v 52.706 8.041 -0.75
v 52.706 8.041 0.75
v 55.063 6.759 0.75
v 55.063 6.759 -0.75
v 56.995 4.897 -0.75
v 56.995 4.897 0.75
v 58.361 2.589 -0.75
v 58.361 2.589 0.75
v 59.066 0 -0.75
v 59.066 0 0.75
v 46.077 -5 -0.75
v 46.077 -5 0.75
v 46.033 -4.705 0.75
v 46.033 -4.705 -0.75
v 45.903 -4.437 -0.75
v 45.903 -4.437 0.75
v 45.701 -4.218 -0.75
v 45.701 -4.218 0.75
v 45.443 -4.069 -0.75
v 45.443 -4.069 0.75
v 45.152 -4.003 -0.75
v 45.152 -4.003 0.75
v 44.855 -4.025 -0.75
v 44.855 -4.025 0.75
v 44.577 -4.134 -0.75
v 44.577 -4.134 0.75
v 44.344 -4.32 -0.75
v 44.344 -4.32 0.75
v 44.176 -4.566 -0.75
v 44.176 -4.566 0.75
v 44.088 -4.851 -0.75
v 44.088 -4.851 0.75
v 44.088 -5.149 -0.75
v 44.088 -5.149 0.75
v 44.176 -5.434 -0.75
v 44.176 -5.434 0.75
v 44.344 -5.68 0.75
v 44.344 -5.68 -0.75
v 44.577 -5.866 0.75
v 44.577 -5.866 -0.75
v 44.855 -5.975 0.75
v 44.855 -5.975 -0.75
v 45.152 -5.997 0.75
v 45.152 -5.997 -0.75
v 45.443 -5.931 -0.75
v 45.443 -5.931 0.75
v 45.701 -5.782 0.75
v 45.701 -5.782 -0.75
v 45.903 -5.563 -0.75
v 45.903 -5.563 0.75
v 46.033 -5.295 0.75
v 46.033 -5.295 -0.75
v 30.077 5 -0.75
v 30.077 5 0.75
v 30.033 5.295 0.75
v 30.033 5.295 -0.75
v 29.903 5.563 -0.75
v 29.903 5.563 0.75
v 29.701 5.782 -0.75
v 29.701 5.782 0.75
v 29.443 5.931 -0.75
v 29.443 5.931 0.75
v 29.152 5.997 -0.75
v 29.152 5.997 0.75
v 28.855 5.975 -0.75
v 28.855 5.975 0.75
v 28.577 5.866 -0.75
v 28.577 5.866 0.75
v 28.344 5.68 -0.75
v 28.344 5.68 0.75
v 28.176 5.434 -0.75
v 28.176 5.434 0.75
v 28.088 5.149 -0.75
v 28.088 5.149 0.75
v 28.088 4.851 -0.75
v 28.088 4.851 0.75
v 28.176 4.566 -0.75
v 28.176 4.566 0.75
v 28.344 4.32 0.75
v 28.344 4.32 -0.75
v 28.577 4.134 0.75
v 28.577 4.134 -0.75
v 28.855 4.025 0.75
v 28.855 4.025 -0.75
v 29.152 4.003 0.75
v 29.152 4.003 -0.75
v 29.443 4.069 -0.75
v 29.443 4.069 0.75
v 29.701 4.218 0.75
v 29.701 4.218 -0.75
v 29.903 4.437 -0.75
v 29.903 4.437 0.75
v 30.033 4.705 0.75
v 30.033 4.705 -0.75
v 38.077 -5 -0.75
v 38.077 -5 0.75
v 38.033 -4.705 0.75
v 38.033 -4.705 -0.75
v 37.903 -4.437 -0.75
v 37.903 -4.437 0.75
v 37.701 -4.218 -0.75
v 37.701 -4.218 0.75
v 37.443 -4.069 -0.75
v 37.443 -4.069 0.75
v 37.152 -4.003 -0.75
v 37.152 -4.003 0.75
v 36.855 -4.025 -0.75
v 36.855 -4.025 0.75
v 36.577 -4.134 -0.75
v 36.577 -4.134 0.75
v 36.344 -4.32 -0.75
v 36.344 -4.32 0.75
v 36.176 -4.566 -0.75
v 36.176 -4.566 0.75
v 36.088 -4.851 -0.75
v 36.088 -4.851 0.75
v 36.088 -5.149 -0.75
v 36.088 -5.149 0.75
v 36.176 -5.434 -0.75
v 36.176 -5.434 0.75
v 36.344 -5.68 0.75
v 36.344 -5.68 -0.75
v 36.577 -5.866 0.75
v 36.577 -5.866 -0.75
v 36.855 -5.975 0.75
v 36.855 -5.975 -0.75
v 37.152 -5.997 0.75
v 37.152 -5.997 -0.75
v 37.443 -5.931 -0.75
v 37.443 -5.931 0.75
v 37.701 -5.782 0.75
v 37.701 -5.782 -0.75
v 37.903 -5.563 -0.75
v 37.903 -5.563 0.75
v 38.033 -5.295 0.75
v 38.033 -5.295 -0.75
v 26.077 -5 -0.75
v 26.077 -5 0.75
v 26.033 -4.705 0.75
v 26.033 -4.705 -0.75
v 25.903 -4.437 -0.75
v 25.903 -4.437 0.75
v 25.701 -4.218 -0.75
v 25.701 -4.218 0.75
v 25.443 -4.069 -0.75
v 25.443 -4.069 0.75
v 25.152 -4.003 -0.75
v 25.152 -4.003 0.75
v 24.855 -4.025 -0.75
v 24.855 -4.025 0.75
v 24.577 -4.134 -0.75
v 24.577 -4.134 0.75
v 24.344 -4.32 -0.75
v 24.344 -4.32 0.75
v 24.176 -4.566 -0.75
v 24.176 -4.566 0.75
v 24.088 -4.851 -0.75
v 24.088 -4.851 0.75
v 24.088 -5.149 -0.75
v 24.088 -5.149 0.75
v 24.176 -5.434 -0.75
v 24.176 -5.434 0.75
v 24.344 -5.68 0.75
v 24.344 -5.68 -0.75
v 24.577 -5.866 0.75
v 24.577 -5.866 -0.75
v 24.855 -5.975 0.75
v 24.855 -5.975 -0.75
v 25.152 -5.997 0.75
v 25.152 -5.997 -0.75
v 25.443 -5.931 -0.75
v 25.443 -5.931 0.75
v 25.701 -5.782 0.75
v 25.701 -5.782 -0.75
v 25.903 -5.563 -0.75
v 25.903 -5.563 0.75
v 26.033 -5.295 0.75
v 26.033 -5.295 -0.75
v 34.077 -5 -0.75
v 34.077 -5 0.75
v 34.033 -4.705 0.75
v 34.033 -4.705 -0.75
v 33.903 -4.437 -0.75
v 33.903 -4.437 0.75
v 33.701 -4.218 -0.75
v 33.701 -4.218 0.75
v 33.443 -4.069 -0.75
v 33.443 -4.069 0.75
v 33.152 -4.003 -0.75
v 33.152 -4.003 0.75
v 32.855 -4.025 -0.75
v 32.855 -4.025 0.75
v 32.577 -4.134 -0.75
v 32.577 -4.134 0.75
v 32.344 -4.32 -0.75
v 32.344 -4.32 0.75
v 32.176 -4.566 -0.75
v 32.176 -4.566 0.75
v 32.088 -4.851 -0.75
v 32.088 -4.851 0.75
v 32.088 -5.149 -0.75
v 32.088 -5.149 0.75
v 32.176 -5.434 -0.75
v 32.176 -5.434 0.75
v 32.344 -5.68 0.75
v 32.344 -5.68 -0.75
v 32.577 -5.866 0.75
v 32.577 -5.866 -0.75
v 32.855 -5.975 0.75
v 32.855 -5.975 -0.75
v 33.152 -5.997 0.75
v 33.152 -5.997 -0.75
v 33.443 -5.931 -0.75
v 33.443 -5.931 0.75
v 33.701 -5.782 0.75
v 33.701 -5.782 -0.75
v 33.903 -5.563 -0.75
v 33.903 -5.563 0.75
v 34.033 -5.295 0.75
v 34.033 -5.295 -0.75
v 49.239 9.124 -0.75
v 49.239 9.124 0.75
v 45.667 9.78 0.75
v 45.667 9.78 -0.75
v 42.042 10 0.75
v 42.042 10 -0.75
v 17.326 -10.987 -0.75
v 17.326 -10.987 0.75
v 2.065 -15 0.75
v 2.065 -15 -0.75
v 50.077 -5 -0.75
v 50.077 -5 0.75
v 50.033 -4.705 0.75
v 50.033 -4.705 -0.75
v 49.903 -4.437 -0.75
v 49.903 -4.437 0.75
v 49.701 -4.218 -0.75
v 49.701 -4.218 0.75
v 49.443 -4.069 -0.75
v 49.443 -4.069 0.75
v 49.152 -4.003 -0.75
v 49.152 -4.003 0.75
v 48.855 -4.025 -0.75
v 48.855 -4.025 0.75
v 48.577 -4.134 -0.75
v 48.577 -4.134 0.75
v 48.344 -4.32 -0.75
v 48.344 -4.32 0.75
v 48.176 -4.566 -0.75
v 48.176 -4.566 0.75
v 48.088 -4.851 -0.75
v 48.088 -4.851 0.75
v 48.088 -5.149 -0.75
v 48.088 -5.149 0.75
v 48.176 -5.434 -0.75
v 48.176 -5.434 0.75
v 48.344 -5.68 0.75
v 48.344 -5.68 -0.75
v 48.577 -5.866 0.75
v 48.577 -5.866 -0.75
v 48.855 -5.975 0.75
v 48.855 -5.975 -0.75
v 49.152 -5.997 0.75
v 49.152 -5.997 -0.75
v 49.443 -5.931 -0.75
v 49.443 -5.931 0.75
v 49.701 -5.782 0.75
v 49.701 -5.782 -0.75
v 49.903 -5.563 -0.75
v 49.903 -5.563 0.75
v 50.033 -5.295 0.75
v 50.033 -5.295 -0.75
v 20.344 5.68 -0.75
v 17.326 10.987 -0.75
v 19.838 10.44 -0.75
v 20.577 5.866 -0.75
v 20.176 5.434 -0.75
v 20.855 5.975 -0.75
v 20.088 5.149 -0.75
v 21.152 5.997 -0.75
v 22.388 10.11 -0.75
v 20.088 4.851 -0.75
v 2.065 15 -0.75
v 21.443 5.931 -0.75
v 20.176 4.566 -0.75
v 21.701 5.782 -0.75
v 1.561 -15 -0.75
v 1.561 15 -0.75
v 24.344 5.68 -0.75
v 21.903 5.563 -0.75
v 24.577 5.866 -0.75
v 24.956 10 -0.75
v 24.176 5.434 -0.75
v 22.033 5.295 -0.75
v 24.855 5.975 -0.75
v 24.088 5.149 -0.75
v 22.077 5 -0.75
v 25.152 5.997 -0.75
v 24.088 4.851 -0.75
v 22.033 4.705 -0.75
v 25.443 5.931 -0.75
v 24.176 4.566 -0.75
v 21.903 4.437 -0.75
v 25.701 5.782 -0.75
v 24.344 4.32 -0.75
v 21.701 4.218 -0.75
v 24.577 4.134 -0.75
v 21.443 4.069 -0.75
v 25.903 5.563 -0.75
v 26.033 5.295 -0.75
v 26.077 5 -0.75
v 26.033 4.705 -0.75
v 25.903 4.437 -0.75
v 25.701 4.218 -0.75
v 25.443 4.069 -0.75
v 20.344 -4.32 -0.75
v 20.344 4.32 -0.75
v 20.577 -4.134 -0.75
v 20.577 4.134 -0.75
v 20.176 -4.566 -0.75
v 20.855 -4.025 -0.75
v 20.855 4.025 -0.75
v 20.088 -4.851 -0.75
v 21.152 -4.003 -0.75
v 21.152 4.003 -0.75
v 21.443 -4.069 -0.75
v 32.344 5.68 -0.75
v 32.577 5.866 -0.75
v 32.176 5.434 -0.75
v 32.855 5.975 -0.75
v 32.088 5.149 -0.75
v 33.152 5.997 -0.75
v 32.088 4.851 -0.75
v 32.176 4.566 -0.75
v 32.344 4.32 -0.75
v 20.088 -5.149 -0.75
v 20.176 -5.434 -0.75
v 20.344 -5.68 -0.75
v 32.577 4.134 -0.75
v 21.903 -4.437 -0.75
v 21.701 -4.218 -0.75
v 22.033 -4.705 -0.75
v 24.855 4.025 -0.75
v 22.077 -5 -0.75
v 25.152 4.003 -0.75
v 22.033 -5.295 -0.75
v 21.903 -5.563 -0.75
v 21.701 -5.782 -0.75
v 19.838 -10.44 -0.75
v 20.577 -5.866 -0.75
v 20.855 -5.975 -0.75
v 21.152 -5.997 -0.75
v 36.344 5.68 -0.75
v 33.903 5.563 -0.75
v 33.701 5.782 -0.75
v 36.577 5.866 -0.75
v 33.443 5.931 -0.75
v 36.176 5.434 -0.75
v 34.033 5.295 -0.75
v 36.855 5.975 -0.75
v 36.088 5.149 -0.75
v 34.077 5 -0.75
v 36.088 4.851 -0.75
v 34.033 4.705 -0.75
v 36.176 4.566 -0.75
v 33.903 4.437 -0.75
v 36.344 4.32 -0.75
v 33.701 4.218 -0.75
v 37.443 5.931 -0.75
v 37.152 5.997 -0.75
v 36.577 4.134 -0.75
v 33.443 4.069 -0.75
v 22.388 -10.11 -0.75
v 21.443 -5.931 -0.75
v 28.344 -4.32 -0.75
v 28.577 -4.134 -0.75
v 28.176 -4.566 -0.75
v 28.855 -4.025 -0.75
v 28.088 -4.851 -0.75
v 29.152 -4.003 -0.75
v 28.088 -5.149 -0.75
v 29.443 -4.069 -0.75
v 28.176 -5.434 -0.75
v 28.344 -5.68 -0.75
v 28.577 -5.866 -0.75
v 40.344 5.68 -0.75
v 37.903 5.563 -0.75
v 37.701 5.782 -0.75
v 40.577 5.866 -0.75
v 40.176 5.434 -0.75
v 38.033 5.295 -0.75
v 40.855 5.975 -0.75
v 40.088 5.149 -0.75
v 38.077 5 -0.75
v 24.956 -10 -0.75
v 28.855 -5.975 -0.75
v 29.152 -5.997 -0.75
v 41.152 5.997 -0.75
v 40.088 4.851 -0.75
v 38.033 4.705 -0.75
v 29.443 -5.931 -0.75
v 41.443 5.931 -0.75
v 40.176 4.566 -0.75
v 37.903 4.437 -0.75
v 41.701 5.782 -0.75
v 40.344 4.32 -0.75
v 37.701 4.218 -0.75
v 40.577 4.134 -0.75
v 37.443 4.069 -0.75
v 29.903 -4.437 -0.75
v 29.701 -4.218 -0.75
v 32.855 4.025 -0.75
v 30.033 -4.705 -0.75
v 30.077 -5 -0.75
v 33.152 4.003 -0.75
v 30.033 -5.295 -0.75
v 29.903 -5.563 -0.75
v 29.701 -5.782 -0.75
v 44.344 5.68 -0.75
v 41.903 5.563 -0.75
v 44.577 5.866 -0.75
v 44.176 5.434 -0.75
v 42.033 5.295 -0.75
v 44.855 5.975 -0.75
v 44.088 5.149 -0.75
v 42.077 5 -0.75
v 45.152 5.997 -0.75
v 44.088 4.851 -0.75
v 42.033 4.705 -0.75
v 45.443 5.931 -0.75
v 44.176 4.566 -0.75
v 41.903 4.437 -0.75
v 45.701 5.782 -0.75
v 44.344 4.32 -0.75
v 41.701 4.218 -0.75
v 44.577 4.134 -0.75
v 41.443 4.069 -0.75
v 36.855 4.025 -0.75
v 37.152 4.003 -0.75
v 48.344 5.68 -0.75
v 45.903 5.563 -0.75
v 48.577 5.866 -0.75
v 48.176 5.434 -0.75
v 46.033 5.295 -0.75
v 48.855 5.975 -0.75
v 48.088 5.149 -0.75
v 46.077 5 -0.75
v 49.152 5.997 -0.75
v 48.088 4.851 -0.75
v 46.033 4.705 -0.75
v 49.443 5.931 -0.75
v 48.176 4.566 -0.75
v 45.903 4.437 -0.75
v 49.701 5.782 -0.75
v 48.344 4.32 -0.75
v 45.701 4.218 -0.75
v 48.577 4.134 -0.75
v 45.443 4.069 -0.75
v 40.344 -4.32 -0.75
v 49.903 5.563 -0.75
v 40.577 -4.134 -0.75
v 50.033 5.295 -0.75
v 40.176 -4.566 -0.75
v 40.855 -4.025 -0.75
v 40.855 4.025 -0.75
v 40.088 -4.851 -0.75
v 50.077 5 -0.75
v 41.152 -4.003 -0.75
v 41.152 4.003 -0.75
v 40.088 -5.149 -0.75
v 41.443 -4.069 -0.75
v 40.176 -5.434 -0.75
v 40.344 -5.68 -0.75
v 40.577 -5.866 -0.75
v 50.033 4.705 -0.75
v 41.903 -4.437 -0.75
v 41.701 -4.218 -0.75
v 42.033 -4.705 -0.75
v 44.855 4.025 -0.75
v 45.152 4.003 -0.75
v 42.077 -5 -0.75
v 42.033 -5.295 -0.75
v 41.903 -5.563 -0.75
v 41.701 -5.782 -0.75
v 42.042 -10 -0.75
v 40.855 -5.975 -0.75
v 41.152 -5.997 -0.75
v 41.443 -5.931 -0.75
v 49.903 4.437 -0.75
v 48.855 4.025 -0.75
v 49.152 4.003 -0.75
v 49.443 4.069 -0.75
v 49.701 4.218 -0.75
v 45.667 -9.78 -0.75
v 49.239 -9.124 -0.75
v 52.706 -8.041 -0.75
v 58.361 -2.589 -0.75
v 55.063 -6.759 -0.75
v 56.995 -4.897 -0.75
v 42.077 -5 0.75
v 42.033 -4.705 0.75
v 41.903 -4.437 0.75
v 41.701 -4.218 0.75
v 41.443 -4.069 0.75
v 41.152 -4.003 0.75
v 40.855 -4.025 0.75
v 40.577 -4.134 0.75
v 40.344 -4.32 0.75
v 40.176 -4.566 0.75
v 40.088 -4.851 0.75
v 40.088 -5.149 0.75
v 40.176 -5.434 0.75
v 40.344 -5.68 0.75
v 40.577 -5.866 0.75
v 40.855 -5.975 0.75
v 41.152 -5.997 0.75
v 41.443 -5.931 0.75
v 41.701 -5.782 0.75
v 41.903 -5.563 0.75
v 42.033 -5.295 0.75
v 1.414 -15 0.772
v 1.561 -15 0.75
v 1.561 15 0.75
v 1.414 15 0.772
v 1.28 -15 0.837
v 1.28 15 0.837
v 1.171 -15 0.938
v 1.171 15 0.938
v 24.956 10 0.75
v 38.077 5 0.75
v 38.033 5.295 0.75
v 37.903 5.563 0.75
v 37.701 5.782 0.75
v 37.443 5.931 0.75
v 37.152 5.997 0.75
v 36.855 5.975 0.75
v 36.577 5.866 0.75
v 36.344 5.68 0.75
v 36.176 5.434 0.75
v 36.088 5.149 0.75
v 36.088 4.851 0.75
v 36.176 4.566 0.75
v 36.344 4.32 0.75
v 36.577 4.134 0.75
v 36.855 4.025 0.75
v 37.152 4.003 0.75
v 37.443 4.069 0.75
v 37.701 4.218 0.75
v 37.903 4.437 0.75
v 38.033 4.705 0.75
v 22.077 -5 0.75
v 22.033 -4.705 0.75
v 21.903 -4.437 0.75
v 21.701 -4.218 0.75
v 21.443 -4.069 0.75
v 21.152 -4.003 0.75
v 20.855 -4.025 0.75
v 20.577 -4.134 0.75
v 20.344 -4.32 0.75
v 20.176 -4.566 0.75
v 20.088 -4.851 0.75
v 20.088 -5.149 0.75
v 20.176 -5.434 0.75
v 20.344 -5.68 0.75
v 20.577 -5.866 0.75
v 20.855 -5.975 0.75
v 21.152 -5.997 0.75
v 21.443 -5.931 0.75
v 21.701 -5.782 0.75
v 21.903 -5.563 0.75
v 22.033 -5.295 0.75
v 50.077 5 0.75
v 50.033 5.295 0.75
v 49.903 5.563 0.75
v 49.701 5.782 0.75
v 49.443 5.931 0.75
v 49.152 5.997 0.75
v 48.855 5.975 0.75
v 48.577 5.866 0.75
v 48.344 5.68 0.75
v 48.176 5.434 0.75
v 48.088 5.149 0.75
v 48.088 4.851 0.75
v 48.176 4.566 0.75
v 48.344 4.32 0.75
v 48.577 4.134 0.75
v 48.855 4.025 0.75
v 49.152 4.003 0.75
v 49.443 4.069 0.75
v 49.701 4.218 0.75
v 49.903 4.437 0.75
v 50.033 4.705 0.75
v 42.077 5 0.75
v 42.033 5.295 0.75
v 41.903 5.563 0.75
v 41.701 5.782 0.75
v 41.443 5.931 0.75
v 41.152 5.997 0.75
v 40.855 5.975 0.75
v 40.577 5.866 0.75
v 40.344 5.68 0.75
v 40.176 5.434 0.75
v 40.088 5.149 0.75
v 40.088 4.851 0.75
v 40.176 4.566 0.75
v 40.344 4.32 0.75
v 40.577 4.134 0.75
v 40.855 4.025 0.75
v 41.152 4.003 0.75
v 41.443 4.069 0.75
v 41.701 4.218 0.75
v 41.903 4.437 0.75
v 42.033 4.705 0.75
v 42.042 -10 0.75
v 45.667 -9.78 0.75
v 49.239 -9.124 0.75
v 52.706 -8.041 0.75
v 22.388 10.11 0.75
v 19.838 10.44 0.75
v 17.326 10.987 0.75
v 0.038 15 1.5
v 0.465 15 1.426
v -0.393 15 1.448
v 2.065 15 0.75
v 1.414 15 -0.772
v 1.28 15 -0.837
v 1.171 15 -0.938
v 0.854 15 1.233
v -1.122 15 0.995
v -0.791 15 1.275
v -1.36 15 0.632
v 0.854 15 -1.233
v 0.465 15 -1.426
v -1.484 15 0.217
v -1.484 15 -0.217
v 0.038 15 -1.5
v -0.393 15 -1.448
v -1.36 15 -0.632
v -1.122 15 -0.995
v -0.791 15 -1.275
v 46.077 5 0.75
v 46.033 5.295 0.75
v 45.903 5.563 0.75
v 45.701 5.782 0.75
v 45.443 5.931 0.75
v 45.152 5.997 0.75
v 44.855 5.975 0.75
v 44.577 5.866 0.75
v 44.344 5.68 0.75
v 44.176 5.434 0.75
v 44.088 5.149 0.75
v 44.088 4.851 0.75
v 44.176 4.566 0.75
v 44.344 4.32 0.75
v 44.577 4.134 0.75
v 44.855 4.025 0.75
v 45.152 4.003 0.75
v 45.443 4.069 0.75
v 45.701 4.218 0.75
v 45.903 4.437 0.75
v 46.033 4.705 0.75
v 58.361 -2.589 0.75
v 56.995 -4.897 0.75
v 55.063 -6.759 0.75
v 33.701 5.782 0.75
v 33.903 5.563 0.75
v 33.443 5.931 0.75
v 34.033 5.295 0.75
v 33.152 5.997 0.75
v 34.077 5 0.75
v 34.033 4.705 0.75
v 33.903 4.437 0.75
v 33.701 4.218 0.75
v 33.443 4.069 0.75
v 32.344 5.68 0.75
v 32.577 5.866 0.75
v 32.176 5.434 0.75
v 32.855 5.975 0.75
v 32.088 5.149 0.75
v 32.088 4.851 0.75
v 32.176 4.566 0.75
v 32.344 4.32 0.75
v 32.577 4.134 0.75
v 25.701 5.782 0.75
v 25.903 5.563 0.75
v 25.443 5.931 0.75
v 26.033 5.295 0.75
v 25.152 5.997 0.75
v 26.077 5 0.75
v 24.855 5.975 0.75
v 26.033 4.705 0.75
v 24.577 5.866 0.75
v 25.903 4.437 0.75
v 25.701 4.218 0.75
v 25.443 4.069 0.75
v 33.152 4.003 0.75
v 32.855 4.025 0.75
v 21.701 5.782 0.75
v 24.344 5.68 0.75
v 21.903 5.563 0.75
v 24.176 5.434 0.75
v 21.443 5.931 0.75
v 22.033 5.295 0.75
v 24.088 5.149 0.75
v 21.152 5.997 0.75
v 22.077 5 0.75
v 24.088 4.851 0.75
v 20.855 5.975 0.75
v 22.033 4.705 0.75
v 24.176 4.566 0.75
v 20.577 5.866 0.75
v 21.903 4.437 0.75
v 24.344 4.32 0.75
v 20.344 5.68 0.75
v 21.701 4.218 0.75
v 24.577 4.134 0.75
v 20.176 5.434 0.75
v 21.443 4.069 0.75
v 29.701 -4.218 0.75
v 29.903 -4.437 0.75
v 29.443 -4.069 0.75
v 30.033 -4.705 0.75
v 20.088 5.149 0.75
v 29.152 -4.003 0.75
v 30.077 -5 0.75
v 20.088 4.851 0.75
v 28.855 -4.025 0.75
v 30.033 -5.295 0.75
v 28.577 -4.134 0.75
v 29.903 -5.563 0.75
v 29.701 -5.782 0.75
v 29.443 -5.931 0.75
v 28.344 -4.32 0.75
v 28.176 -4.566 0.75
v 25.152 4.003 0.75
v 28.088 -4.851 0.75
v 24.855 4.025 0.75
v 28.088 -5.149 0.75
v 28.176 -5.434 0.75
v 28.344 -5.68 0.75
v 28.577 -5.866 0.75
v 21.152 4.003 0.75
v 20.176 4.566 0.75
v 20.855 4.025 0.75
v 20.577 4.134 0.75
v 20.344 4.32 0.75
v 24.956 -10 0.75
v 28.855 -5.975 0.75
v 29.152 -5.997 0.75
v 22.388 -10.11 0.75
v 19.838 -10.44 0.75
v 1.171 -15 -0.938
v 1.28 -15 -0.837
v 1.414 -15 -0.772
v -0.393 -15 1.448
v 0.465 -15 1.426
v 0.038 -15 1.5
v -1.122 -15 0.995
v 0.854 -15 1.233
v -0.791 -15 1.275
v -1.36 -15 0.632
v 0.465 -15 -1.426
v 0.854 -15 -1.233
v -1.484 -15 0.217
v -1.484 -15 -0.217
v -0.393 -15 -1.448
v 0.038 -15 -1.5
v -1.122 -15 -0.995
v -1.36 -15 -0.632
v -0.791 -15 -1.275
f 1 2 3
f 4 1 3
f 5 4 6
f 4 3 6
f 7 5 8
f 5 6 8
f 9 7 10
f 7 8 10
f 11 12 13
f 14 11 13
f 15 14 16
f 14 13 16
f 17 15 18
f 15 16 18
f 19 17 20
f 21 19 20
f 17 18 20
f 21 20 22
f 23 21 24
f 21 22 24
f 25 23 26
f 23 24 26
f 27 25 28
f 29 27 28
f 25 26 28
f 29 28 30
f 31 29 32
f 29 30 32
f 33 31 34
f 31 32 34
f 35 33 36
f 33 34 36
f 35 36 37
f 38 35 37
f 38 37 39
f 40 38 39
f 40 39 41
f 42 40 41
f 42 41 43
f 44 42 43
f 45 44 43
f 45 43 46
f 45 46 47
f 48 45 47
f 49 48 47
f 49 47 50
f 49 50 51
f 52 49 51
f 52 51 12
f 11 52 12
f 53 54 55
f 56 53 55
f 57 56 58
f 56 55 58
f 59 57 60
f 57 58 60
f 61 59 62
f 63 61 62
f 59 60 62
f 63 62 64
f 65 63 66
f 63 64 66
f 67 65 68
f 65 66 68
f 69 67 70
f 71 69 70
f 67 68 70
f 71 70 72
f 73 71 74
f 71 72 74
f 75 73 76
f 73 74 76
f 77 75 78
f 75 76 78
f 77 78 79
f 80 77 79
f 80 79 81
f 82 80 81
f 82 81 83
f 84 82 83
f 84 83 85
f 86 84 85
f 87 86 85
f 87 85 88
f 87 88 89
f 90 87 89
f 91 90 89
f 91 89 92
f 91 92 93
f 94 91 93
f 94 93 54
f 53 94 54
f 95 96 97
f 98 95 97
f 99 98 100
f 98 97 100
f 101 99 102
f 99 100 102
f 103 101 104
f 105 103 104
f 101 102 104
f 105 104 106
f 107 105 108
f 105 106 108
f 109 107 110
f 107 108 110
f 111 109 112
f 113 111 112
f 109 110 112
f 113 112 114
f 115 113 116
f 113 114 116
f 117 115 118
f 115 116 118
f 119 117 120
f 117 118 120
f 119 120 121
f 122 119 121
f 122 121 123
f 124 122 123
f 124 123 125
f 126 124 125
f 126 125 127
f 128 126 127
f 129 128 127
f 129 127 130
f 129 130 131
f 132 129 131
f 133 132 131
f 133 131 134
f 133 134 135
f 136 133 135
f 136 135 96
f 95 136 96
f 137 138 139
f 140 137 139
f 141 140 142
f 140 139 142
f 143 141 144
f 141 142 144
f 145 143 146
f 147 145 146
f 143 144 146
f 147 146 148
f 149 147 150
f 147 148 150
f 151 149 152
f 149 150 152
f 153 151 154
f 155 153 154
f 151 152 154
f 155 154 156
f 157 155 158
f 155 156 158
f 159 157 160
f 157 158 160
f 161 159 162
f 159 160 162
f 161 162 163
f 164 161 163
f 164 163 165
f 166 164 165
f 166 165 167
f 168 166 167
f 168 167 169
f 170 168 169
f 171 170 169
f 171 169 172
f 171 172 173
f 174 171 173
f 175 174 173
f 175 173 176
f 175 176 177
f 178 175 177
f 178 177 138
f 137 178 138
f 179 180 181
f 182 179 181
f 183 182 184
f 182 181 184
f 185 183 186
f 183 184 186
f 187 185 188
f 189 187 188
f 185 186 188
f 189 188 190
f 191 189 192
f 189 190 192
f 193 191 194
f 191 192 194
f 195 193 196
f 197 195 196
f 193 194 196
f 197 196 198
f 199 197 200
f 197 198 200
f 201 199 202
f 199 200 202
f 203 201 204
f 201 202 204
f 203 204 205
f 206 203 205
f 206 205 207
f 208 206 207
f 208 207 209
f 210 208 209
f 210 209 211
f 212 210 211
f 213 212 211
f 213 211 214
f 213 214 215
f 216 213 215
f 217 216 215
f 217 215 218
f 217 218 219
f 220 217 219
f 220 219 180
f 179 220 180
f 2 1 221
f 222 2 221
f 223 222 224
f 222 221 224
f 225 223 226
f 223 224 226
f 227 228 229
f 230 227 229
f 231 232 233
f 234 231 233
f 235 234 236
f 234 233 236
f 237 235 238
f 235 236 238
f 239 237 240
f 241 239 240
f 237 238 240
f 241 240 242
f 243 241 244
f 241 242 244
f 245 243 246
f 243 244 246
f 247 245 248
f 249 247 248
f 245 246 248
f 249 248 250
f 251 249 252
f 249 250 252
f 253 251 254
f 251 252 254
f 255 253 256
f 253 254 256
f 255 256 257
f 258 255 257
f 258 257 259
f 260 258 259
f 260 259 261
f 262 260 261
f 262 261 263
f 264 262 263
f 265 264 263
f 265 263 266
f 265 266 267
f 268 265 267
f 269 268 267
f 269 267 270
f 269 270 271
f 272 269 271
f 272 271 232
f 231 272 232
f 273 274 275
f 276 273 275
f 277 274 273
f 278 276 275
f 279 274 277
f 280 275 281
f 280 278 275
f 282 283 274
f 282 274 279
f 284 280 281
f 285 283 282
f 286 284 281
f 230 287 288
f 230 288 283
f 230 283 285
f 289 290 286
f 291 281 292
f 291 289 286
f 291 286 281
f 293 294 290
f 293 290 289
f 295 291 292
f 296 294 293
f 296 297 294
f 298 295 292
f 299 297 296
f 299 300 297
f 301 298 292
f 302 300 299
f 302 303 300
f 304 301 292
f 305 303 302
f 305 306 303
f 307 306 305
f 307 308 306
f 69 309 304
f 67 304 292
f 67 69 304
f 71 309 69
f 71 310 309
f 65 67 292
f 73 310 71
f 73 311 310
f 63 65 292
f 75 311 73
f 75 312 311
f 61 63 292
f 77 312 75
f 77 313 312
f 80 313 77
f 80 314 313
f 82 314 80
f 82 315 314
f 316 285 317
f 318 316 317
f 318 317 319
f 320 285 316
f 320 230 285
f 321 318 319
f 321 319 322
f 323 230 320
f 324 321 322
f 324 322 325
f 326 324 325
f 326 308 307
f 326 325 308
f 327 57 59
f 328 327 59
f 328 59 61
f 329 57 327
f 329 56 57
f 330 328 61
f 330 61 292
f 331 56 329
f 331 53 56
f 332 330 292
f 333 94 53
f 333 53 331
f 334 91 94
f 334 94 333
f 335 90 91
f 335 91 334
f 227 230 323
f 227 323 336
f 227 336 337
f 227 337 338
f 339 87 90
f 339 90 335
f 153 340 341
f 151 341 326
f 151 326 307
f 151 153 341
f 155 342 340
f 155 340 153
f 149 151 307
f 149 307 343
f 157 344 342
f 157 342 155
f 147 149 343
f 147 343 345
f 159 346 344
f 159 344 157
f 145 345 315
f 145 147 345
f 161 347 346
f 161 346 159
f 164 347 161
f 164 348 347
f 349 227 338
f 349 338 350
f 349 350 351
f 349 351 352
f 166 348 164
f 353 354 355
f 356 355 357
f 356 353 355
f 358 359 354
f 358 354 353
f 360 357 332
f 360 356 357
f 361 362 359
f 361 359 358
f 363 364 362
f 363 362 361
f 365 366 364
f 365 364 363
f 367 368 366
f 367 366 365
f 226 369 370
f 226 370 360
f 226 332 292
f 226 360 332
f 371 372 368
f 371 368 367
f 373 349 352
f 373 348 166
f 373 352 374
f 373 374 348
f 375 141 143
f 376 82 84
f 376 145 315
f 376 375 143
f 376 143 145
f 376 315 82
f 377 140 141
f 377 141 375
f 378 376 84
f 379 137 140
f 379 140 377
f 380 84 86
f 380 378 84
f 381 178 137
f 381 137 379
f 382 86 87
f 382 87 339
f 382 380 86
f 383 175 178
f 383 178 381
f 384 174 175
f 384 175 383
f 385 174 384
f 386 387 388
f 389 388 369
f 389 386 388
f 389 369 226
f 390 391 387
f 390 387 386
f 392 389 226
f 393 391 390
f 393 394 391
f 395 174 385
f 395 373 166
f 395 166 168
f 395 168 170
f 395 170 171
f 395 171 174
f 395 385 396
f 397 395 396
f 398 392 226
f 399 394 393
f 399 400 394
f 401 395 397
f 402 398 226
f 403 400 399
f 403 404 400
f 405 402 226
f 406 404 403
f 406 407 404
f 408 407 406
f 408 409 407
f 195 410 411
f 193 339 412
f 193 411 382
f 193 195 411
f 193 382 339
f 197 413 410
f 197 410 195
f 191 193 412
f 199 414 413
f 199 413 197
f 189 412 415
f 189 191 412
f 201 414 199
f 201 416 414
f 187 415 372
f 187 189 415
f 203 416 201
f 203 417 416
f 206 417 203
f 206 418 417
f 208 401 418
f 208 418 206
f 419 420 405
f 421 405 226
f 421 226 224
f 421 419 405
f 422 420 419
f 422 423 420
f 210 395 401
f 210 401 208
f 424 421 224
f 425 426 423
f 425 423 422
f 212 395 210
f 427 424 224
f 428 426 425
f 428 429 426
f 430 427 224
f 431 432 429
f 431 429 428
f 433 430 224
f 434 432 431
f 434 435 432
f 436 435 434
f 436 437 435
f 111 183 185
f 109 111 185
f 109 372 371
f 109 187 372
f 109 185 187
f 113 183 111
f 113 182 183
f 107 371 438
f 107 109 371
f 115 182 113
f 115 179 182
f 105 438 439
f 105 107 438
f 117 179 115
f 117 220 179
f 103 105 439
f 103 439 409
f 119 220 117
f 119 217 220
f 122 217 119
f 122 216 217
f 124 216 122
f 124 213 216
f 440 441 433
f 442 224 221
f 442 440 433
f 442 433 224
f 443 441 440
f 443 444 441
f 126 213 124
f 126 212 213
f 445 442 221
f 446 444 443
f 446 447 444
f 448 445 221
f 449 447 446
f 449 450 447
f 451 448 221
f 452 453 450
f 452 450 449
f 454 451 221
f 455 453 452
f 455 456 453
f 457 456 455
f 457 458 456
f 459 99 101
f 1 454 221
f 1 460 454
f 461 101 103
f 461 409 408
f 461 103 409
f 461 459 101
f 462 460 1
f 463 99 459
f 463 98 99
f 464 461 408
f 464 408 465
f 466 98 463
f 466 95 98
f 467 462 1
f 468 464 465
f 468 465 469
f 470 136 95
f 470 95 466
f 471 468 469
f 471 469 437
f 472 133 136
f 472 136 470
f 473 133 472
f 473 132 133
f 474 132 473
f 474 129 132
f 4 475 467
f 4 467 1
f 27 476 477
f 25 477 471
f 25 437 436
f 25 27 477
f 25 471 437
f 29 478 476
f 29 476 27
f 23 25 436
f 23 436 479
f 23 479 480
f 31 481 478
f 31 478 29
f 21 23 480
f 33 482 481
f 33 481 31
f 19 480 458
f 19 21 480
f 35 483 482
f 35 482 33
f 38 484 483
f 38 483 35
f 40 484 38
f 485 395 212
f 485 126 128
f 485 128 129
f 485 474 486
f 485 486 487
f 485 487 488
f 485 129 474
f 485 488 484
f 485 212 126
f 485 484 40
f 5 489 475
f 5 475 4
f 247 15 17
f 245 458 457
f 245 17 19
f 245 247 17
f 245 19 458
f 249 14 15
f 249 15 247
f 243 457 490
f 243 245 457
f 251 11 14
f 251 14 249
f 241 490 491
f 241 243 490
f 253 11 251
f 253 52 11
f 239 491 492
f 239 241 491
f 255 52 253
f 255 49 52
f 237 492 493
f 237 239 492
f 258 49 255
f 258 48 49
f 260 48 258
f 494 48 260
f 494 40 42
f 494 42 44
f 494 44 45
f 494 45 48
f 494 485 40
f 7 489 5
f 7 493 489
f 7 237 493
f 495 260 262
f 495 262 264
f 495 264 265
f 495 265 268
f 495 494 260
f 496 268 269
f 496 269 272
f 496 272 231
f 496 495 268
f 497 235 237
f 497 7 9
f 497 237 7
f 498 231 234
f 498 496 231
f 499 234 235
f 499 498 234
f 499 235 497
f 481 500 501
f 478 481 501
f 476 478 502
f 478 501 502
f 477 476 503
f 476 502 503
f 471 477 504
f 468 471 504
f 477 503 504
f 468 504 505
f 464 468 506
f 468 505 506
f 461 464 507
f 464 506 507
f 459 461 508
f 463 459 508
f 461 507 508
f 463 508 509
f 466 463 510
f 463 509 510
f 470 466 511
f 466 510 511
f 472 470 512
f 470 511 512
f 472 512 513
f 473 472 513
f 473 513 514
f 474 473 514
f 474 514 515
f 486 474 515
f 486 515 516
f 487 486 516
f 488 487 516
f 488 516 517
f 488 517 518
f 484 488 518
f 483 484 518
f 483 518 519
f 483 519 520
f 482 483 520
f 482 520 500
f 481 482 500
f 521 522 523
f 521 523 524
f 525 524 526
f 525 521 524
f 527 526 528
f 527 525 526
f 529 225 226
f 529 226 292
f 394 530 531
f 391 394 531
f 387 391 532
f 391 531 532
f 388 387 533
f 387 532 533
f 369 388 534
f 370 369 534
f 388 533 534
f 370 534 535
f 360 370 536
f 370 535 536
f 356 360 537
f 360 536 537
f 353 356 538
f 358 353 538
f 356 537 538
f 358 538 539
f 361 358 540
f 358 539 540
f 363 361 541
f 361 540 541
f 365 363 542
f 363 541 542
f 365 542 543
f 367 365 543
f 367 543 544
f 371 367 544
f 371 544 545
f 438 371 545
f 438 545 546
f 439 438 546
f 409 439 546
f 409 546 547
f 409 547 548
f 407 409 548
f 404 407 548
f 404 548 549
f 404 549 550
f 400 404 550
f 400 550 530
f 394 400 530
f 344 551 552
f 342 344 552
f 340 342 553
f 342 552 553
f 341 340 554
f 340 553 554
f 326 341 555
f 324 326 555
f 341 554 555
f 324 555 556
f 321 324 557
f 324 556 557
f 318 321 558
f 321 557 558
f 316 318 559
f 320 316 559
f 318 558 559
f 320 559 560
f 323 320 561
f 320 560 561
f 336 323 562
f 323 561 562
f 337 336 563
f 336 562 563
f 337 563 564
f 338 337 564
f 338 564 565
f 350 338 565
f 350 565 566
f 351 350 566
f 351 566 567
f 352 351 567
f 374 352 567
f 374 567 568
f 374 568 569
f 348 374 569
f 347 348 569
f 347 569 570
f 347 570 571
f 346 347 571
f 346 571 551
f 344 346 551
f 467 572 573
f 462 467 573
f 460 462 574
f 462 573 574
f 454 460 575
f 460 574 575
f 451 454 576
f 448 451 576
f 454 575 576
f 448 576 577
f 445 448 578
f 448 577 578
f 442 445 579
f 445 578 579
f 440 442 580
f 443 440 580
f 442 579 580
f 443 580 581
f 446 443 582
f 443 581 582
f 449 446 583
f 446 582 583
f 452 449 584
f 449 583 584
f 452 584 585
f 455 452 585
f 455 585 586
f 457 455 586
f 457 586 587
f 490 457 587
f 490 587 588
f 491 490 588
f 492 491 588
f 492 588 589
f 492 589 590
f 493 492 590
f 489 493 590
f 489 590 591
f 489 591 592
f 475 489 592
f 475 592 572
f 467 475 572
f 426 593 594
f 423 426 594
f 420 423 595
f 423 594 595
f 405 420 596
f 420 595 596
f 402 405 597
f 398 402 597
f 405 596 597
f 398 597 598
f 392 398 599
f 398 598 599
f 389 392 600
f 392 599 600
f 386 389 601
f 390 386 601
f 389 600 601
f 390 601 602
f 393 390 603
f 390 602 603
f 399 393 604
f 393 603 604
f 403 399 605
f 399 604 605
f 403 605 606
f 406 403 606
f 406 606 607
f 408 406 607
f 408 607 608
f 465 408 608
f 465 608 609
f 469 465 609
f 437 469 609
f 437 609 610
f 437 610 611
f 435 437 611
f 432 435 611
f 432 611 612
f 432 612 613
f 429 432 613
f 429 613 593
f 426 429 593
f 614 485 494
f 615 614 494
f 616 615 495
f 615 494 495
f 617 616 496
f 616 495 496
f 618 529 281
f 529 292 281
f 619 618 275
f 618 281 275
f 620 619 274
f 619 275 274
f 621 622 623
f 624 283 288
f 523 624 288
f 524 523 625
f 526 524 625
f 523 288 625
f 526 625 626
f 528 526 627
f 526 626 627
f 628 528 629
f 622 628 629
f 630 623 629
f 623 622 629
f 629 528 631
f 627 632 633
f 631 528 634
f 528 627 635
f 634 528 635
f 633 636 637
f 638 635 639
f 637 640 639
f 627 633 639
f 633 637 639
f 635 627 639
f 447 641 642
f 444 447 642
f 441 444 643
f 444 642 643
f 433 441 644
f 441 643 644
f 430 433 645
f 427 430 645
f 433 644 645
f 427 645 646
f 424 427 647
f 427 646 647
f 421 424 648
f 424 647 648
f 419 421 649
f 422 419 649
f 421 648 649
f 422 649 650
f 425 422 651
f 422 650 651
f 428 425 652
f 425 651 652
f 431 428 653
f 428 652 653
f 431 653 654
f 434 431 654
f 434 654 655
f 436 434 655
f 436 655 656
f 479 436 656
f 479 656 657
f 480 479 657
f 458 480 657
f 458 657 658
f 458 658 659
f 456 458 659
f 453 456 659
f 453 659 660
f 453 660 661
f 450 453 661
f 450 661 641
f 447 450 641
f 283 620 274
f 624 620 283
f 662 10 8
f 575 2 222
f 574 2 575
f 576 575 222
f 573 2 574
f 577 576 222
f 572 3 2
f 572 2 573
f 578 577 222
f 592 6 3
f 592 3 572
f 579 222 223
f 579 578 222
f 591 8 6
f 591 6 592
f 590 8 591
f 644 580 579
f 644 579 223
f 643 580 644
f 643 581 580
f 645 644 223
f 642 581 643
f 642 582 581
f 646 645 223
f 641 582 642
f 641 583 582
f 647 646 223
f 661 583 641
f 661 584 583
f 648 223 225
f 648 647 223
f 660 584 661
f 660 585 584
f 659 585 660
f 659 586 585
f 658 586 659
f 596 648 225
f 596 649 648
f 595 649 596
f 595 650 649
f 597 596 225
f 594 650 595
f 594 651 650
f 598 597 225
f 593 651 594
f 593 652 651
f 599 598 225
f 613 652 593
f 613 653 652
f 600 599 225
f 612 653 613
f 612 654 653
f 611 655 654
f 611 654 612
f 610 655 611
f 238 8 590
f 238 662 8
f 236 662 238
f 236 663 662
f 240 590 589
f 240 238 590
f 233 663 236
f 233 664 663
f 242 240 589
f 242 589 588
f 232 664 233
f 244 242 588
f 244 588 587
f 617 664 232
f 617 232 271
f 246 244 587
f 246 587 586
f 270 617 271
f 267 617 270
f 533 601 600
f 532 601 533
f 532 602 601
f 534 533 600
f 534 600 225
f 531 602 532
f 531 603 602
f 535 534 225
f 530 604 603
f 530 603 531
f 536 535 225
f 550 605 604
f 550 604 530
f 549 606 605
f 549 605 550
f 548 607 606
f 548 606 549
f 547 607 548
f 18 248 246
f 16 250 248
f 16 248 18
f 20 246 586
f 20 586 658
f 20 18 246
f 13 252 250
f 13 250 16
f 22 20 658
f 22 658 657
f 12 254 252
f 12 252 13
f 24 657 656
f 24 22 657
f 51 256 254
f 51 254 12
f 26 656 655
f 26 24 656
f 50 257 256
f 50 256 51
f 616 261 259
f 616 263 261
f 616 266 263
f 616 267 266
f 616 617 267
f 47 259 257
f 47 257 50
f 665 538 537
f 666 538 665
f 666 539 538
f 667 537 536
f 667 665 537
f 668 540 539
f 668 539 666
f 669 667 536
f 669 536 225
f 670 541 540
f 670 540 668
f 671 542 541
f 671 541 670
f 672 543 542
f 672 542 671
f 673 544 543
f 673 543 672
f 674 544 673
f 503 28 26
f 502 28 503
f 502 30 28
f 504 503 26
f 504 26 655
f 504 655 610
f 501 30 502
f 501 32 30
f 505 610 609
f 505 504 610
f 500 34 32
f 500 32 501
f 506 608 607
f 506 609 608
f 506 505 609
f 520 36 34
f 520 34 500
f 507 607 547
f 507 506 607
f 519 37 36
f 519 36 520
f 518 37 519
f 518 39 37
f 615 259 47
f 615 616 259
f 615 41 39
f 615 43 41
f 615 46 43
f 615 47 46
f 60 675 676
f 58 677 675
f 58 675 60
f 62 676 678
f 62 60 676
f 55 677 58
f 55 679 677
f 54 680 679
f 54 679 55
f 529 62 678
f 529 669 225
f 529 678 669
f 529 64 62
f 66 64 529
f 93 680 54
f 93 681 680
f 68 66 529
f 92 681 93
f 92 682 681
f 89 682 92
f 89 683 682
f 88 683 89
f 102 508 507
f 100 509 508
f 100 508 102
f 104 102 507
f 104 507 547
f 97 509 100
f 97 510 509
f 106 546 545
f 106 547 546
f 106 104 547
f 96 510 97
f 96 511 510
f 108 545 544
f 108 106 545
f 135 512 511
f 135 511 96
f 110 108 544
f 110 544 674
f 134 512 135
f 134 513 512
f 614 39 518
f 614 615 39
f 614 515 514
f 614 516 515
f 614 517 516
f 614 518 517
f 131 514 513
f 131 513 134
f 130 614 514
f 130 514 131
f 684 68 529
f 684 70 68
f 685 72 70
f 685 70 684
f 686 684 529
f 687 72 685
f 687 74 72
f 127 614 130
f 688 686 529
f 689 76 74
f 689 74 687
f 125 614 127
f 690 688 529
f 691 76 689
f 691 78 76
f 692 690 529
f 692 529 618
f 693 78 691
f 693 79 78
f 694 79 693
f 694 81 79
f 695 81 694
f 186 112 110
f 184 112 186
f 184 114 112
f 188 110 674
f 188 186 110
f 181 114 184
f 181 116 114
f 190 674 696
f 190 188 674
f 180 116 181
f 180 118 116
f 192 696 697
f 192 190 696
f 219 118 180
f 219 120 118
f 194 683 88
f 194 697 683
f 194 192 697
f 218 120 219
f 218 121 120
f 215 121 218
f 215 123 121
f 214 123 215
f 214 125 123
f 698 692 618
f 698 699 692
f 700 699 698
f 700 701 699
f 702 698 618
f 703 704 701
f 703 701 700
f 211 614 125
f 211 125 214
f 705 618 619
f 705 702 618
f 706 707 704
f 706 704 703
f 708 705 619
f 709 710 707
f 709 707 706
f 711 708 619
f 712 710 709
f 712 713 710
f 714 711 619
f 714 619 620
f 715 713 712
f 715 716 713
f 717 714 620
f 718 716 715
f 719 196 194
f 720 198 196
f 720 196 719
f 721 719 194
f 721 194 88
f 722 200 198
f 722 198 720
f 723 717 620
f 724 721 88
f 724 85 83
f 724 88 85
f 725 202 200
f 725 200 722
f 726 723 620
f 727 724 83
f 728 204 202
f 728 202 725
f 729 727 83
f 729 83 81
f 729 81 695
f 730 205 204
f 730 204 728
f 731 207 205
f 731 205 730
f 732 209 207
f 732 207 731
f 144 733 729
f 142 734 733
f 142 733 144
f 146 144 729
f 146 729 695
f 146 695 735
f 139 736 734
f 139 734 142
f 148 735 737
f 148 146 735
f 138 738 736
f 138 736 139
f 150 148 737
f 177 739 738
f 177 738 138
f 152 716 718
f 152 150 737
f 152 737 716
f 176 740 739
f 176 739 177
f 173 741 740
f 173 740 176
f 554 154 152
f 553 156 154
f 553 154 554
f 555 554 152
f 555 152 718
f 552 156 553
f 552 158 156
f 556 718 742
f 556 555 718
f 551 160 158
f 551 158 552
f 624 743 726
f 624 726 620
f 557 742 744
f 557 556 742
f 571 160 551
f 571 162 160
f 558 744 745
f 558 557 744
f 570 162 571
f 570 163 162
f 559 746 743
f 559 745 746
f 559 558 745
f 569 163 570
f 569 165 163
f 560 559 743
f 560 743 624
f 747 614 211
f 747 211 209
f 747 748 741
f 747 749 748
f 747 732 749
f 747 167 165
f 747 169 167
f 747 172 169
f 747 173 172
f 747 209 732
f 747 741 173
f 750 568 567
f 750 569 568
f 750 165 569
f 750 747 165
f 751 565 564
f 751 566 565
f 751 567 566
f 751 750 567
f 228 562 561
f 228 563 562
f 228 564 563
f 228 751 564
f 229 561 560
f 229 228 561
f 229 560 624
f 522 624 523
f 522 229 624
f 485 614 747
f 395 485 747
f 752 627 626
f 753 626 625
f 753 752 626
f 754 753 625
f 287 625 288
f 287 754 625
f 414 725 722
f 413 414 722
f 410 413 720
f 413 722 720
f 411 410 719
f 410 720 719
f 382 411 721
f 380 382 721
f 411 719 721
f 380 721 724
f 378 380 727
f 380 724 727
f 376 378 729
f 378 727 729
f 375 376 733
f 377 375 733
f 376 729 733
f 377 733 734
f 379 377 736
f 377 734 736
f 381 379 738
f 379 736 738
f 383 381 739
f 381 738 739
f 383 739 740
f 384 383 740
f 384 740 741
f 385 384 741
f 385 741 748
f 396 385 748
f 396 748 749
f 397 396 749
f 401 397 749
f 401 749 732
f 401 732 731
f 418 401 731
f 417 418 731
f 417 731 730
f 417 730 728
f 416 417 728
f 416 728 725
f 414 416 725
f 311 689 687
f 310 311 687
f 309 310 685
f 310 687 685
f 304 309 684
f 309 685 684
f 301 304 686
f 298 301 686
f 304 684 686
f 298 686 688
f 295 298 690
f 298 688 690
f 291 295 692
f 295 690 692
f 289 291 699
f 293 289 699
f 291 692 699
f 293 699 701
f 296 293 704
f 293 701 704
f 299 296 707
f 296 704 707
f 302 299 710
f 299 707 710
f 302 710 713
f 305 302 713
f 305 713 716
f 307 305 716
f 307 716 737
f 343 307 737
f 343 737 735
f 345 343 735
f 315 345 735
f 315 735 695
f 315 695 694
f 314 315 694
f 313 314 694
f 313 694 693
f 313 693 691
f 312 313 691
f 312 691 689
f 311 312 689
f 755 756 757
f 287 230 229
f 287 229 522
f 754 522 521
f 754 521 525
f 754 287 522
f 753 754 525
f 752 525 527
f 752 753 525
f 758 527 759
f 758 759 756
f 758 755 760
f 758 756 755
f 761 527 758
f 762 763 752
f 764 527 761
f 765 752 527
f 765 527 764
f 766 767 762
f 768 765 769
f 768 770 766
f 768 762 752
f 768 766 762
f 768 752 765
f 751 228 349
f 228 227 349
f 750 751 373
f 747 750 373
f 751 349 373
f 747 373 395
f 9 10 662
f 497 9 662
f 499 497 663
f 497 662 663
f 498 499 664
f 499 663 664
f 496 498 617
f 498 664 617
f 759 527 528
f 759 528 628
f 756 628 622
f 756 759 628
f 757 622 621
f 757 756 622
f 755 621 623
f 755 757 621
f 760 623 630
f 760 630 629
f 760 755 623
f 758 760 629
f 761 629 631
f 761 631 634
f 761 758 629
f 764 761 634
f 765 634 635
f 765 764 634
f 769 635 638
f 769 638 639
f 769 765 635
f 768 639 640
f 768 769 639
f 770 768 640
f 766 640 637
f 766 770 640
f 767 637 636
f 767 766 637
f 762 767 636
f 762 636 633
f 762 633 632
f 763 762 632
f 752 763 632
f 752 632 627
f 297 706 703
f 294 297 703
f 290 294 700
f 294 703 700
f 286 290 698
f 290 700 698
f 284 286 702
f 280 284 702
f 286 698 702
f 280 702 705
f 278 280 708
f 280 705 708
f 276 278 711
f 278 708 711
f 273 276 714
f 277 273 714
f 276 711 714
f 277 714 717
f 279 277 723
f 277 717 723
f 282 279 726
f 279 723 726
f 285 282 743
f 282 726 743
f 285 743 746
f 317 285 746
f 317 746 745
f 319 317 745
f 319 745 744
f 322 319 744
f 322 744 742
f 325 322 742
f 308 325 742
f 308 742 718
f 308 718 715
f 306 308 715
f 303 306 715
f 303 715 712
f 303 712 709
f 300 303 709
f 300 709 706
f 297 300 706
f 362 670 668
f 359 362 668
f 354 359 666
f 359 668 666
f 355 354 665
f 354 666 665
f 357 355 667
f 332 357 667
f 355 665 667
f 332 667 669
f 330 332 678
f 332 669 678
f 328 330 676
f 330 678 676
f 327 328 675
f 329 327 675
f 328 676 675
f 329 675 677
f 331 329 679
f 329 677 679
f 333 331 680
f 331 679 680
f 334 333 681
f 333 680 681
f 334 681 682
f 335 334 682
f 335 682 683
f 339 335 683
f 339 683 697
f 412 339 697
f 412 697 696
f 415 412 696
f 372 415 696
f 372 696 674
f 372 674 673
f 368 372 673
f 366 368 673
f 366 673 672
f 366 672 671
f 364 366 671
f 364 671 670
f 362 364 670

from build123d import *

# Parameters (mm, degrees)
BOSS_EXTRUDE1_DEPTH      = 15
BOSS_EXTRUDE1_DEPTH_BACK = 15
SKETCH2_R                = 1
CUT_EXTRUDE1_DEPTH       = 62.064988474
FILLET1_R                = 30
FILLET2_R                = 10


with BuildPart() as part:
    # Sketch1 → Boss-Extrude1 (new, two sides: drawn at the far end of the back side and taken through both)
    with BuildSketch(Plane(origin=(0, 0, 0), x_dir=(1, 0, 0), z_dir=(0, 1, 0)).offset(-BOSS_EXTRUDE1_DEPTH_BACK)):
        with BuildLine():
            Line((1.5612495, 0.75), (59.1512495, 0.75))
            Line((59.1512495, 0.75), (59.1512495, -0.75))
            Line((59.1512495, -0.75), (1.5612495, -0.75))
            ThreePointArc((1.5612495, -0.75), (1.344743149, -0.799306091), (1.170937125, -0.9375))
            ThreePointArc((1.170937125, -0.9375), (-1.5, 0), (1.170937125, 0.9375))
            ThreePointArc((1.170937125, 0.9375), (1.344743149, 0.799306091), (1.5612495, 0.75))
        make_face()
    extrude(amount=BOSS_EXTRUDE1_DEPTH + BOSS_EXTRUDE1_DEPTH_BACK)

    # Sketch2 → Cut-Extrude1 (cut, through all)
    with BuildSketch(Plane.XY.offset(0.75)):
        with Locations((49.0772495, 5)):
            Circle(SKETCH2_R)
        with Locations((45.0772495, 5)):
            Circle(SKETCH2_R)
        with Locations((41.0772495, 5)):
            Circle(SKETCH2_R)
        with Locations((37.0772495, 5)):
            Circle(SKETCH2_R)
        with Locations((33.0772495, 5)):
            Circle(SKETCH2_R)
        with Locations((29.0772495, 5)):
            Circle(SKETCH2_R)
        with Locations((25.0772495, 5)):
            Circle(SKETCH2_R)
        with Locations((21.0772495, 5)):
            Circle(SKETCH2_R)
        with Locations((45.0772495, -5)):
            Circle(SKETCH2_R)
        with Locations((41.0772495, -5)):
            Circle(SKETCH2_R)
        with Locations((37.0772495, -5)):
            Circle(SKETCH2_R)
        with Locations((33.0772495, -5)):
            Circle(SKETCH2_R)
        with Locations((29.0772495, -5)):
            Circle(SKETCH2_R)
        with Locations((25.0772495, -5)):
            Circle(SKETCH2_R)
        with Locations((21.0772495, -5)):
            Circle(SKETCH2_R)
        with Locations((49.0772495, -5)):
            Circle(SKETCH2_R)
        Polygon((49.0772495, 10), (21.0772495, 10), (2.0652495, 15), (59.1512495, 15), (59.1512495, 5), align=None)
        Polygon((49.0772495, -10), (21.0772495, -10), (2.0652495, -15), (59.1512495, -15), (59.1512495, -5), align=None)
    extrude(amount=-CUT_EXTRUDE1_DEPTH, mode=Mode.SUBTRACT)

    # Fillet1
    fillet1_edges = [part.edges().sort_by_distance(p)[0] for p in [
        (49.0772495, 10, 0),
        (21.0772495, 10, 0),
        (49.0772495, -10, 0),
        (21.0772495, -10, 0),
    ]]
    fillet(fillet1_edges, radius=FILLET1_R)

    # Fillet2
    # the kernel refuses this fillet: 10 mm, written as the material it takes off along each edge
    with BuildSketch(Plane(origin=(59.1512495, -5, 18.566207641), x_dir=(-0.9044112472912746, -0.42666180491466615, 0), z_dir=(0, 0, -1))) as fillet2_piece_1:
        with BuildLine():
            CenterArc((6.353468821, 9.970077682), FILLET2_R, 205.255895662, 69.177572528)
            Line((-2.690643652, 5.703459633), (-3.595054899, 5.276797828))
            Line((-3.595054899, 5.276797828), (-0.904411247, -0.426661805))
            Line((-0.904411247, -0.426661805), (-0.019905188, -0.999801872))
            ThreePointArc((-0.019905188, -0.999801872), (4.190379521, -1.083624989), (7.20378448, -0.997007768))
            Line((7.20378448, -0.997007768), (7.126483056, 0))
        make_face()
    extrude(amount=37.132415281, mode=Mode.SUBTRACT)
    with BuildSketch(Plane(origin=(59.1512495, 5, 18.566207641), x_dir=(0, -1, 0), z_dir=(0, 0, -1))) as fillet2_piece_2:
        with BuildLine():
            CenterArc((6.306267918, 10), FILLET2_R, 200.822427472, 69.177572528)
            Line((-3.040598123, 6.44527143), (-3.975284728, 6.089798573))
            ThreePointArc((-3.975284728, 6.089798573), (-2.767917517, 3.327484976), (-0.895739275, -0.444579747))
            Line((-0.895739275, -0.444579747), (0, -1))
            Line((0, -1), (6.306267918, -1))
            Line((6.306267918, -1), (6.306267918, 0))
        make_face()
    extrude(amount=37.132415281, mode=Mode.SUBTRACT)


solid = part.part
